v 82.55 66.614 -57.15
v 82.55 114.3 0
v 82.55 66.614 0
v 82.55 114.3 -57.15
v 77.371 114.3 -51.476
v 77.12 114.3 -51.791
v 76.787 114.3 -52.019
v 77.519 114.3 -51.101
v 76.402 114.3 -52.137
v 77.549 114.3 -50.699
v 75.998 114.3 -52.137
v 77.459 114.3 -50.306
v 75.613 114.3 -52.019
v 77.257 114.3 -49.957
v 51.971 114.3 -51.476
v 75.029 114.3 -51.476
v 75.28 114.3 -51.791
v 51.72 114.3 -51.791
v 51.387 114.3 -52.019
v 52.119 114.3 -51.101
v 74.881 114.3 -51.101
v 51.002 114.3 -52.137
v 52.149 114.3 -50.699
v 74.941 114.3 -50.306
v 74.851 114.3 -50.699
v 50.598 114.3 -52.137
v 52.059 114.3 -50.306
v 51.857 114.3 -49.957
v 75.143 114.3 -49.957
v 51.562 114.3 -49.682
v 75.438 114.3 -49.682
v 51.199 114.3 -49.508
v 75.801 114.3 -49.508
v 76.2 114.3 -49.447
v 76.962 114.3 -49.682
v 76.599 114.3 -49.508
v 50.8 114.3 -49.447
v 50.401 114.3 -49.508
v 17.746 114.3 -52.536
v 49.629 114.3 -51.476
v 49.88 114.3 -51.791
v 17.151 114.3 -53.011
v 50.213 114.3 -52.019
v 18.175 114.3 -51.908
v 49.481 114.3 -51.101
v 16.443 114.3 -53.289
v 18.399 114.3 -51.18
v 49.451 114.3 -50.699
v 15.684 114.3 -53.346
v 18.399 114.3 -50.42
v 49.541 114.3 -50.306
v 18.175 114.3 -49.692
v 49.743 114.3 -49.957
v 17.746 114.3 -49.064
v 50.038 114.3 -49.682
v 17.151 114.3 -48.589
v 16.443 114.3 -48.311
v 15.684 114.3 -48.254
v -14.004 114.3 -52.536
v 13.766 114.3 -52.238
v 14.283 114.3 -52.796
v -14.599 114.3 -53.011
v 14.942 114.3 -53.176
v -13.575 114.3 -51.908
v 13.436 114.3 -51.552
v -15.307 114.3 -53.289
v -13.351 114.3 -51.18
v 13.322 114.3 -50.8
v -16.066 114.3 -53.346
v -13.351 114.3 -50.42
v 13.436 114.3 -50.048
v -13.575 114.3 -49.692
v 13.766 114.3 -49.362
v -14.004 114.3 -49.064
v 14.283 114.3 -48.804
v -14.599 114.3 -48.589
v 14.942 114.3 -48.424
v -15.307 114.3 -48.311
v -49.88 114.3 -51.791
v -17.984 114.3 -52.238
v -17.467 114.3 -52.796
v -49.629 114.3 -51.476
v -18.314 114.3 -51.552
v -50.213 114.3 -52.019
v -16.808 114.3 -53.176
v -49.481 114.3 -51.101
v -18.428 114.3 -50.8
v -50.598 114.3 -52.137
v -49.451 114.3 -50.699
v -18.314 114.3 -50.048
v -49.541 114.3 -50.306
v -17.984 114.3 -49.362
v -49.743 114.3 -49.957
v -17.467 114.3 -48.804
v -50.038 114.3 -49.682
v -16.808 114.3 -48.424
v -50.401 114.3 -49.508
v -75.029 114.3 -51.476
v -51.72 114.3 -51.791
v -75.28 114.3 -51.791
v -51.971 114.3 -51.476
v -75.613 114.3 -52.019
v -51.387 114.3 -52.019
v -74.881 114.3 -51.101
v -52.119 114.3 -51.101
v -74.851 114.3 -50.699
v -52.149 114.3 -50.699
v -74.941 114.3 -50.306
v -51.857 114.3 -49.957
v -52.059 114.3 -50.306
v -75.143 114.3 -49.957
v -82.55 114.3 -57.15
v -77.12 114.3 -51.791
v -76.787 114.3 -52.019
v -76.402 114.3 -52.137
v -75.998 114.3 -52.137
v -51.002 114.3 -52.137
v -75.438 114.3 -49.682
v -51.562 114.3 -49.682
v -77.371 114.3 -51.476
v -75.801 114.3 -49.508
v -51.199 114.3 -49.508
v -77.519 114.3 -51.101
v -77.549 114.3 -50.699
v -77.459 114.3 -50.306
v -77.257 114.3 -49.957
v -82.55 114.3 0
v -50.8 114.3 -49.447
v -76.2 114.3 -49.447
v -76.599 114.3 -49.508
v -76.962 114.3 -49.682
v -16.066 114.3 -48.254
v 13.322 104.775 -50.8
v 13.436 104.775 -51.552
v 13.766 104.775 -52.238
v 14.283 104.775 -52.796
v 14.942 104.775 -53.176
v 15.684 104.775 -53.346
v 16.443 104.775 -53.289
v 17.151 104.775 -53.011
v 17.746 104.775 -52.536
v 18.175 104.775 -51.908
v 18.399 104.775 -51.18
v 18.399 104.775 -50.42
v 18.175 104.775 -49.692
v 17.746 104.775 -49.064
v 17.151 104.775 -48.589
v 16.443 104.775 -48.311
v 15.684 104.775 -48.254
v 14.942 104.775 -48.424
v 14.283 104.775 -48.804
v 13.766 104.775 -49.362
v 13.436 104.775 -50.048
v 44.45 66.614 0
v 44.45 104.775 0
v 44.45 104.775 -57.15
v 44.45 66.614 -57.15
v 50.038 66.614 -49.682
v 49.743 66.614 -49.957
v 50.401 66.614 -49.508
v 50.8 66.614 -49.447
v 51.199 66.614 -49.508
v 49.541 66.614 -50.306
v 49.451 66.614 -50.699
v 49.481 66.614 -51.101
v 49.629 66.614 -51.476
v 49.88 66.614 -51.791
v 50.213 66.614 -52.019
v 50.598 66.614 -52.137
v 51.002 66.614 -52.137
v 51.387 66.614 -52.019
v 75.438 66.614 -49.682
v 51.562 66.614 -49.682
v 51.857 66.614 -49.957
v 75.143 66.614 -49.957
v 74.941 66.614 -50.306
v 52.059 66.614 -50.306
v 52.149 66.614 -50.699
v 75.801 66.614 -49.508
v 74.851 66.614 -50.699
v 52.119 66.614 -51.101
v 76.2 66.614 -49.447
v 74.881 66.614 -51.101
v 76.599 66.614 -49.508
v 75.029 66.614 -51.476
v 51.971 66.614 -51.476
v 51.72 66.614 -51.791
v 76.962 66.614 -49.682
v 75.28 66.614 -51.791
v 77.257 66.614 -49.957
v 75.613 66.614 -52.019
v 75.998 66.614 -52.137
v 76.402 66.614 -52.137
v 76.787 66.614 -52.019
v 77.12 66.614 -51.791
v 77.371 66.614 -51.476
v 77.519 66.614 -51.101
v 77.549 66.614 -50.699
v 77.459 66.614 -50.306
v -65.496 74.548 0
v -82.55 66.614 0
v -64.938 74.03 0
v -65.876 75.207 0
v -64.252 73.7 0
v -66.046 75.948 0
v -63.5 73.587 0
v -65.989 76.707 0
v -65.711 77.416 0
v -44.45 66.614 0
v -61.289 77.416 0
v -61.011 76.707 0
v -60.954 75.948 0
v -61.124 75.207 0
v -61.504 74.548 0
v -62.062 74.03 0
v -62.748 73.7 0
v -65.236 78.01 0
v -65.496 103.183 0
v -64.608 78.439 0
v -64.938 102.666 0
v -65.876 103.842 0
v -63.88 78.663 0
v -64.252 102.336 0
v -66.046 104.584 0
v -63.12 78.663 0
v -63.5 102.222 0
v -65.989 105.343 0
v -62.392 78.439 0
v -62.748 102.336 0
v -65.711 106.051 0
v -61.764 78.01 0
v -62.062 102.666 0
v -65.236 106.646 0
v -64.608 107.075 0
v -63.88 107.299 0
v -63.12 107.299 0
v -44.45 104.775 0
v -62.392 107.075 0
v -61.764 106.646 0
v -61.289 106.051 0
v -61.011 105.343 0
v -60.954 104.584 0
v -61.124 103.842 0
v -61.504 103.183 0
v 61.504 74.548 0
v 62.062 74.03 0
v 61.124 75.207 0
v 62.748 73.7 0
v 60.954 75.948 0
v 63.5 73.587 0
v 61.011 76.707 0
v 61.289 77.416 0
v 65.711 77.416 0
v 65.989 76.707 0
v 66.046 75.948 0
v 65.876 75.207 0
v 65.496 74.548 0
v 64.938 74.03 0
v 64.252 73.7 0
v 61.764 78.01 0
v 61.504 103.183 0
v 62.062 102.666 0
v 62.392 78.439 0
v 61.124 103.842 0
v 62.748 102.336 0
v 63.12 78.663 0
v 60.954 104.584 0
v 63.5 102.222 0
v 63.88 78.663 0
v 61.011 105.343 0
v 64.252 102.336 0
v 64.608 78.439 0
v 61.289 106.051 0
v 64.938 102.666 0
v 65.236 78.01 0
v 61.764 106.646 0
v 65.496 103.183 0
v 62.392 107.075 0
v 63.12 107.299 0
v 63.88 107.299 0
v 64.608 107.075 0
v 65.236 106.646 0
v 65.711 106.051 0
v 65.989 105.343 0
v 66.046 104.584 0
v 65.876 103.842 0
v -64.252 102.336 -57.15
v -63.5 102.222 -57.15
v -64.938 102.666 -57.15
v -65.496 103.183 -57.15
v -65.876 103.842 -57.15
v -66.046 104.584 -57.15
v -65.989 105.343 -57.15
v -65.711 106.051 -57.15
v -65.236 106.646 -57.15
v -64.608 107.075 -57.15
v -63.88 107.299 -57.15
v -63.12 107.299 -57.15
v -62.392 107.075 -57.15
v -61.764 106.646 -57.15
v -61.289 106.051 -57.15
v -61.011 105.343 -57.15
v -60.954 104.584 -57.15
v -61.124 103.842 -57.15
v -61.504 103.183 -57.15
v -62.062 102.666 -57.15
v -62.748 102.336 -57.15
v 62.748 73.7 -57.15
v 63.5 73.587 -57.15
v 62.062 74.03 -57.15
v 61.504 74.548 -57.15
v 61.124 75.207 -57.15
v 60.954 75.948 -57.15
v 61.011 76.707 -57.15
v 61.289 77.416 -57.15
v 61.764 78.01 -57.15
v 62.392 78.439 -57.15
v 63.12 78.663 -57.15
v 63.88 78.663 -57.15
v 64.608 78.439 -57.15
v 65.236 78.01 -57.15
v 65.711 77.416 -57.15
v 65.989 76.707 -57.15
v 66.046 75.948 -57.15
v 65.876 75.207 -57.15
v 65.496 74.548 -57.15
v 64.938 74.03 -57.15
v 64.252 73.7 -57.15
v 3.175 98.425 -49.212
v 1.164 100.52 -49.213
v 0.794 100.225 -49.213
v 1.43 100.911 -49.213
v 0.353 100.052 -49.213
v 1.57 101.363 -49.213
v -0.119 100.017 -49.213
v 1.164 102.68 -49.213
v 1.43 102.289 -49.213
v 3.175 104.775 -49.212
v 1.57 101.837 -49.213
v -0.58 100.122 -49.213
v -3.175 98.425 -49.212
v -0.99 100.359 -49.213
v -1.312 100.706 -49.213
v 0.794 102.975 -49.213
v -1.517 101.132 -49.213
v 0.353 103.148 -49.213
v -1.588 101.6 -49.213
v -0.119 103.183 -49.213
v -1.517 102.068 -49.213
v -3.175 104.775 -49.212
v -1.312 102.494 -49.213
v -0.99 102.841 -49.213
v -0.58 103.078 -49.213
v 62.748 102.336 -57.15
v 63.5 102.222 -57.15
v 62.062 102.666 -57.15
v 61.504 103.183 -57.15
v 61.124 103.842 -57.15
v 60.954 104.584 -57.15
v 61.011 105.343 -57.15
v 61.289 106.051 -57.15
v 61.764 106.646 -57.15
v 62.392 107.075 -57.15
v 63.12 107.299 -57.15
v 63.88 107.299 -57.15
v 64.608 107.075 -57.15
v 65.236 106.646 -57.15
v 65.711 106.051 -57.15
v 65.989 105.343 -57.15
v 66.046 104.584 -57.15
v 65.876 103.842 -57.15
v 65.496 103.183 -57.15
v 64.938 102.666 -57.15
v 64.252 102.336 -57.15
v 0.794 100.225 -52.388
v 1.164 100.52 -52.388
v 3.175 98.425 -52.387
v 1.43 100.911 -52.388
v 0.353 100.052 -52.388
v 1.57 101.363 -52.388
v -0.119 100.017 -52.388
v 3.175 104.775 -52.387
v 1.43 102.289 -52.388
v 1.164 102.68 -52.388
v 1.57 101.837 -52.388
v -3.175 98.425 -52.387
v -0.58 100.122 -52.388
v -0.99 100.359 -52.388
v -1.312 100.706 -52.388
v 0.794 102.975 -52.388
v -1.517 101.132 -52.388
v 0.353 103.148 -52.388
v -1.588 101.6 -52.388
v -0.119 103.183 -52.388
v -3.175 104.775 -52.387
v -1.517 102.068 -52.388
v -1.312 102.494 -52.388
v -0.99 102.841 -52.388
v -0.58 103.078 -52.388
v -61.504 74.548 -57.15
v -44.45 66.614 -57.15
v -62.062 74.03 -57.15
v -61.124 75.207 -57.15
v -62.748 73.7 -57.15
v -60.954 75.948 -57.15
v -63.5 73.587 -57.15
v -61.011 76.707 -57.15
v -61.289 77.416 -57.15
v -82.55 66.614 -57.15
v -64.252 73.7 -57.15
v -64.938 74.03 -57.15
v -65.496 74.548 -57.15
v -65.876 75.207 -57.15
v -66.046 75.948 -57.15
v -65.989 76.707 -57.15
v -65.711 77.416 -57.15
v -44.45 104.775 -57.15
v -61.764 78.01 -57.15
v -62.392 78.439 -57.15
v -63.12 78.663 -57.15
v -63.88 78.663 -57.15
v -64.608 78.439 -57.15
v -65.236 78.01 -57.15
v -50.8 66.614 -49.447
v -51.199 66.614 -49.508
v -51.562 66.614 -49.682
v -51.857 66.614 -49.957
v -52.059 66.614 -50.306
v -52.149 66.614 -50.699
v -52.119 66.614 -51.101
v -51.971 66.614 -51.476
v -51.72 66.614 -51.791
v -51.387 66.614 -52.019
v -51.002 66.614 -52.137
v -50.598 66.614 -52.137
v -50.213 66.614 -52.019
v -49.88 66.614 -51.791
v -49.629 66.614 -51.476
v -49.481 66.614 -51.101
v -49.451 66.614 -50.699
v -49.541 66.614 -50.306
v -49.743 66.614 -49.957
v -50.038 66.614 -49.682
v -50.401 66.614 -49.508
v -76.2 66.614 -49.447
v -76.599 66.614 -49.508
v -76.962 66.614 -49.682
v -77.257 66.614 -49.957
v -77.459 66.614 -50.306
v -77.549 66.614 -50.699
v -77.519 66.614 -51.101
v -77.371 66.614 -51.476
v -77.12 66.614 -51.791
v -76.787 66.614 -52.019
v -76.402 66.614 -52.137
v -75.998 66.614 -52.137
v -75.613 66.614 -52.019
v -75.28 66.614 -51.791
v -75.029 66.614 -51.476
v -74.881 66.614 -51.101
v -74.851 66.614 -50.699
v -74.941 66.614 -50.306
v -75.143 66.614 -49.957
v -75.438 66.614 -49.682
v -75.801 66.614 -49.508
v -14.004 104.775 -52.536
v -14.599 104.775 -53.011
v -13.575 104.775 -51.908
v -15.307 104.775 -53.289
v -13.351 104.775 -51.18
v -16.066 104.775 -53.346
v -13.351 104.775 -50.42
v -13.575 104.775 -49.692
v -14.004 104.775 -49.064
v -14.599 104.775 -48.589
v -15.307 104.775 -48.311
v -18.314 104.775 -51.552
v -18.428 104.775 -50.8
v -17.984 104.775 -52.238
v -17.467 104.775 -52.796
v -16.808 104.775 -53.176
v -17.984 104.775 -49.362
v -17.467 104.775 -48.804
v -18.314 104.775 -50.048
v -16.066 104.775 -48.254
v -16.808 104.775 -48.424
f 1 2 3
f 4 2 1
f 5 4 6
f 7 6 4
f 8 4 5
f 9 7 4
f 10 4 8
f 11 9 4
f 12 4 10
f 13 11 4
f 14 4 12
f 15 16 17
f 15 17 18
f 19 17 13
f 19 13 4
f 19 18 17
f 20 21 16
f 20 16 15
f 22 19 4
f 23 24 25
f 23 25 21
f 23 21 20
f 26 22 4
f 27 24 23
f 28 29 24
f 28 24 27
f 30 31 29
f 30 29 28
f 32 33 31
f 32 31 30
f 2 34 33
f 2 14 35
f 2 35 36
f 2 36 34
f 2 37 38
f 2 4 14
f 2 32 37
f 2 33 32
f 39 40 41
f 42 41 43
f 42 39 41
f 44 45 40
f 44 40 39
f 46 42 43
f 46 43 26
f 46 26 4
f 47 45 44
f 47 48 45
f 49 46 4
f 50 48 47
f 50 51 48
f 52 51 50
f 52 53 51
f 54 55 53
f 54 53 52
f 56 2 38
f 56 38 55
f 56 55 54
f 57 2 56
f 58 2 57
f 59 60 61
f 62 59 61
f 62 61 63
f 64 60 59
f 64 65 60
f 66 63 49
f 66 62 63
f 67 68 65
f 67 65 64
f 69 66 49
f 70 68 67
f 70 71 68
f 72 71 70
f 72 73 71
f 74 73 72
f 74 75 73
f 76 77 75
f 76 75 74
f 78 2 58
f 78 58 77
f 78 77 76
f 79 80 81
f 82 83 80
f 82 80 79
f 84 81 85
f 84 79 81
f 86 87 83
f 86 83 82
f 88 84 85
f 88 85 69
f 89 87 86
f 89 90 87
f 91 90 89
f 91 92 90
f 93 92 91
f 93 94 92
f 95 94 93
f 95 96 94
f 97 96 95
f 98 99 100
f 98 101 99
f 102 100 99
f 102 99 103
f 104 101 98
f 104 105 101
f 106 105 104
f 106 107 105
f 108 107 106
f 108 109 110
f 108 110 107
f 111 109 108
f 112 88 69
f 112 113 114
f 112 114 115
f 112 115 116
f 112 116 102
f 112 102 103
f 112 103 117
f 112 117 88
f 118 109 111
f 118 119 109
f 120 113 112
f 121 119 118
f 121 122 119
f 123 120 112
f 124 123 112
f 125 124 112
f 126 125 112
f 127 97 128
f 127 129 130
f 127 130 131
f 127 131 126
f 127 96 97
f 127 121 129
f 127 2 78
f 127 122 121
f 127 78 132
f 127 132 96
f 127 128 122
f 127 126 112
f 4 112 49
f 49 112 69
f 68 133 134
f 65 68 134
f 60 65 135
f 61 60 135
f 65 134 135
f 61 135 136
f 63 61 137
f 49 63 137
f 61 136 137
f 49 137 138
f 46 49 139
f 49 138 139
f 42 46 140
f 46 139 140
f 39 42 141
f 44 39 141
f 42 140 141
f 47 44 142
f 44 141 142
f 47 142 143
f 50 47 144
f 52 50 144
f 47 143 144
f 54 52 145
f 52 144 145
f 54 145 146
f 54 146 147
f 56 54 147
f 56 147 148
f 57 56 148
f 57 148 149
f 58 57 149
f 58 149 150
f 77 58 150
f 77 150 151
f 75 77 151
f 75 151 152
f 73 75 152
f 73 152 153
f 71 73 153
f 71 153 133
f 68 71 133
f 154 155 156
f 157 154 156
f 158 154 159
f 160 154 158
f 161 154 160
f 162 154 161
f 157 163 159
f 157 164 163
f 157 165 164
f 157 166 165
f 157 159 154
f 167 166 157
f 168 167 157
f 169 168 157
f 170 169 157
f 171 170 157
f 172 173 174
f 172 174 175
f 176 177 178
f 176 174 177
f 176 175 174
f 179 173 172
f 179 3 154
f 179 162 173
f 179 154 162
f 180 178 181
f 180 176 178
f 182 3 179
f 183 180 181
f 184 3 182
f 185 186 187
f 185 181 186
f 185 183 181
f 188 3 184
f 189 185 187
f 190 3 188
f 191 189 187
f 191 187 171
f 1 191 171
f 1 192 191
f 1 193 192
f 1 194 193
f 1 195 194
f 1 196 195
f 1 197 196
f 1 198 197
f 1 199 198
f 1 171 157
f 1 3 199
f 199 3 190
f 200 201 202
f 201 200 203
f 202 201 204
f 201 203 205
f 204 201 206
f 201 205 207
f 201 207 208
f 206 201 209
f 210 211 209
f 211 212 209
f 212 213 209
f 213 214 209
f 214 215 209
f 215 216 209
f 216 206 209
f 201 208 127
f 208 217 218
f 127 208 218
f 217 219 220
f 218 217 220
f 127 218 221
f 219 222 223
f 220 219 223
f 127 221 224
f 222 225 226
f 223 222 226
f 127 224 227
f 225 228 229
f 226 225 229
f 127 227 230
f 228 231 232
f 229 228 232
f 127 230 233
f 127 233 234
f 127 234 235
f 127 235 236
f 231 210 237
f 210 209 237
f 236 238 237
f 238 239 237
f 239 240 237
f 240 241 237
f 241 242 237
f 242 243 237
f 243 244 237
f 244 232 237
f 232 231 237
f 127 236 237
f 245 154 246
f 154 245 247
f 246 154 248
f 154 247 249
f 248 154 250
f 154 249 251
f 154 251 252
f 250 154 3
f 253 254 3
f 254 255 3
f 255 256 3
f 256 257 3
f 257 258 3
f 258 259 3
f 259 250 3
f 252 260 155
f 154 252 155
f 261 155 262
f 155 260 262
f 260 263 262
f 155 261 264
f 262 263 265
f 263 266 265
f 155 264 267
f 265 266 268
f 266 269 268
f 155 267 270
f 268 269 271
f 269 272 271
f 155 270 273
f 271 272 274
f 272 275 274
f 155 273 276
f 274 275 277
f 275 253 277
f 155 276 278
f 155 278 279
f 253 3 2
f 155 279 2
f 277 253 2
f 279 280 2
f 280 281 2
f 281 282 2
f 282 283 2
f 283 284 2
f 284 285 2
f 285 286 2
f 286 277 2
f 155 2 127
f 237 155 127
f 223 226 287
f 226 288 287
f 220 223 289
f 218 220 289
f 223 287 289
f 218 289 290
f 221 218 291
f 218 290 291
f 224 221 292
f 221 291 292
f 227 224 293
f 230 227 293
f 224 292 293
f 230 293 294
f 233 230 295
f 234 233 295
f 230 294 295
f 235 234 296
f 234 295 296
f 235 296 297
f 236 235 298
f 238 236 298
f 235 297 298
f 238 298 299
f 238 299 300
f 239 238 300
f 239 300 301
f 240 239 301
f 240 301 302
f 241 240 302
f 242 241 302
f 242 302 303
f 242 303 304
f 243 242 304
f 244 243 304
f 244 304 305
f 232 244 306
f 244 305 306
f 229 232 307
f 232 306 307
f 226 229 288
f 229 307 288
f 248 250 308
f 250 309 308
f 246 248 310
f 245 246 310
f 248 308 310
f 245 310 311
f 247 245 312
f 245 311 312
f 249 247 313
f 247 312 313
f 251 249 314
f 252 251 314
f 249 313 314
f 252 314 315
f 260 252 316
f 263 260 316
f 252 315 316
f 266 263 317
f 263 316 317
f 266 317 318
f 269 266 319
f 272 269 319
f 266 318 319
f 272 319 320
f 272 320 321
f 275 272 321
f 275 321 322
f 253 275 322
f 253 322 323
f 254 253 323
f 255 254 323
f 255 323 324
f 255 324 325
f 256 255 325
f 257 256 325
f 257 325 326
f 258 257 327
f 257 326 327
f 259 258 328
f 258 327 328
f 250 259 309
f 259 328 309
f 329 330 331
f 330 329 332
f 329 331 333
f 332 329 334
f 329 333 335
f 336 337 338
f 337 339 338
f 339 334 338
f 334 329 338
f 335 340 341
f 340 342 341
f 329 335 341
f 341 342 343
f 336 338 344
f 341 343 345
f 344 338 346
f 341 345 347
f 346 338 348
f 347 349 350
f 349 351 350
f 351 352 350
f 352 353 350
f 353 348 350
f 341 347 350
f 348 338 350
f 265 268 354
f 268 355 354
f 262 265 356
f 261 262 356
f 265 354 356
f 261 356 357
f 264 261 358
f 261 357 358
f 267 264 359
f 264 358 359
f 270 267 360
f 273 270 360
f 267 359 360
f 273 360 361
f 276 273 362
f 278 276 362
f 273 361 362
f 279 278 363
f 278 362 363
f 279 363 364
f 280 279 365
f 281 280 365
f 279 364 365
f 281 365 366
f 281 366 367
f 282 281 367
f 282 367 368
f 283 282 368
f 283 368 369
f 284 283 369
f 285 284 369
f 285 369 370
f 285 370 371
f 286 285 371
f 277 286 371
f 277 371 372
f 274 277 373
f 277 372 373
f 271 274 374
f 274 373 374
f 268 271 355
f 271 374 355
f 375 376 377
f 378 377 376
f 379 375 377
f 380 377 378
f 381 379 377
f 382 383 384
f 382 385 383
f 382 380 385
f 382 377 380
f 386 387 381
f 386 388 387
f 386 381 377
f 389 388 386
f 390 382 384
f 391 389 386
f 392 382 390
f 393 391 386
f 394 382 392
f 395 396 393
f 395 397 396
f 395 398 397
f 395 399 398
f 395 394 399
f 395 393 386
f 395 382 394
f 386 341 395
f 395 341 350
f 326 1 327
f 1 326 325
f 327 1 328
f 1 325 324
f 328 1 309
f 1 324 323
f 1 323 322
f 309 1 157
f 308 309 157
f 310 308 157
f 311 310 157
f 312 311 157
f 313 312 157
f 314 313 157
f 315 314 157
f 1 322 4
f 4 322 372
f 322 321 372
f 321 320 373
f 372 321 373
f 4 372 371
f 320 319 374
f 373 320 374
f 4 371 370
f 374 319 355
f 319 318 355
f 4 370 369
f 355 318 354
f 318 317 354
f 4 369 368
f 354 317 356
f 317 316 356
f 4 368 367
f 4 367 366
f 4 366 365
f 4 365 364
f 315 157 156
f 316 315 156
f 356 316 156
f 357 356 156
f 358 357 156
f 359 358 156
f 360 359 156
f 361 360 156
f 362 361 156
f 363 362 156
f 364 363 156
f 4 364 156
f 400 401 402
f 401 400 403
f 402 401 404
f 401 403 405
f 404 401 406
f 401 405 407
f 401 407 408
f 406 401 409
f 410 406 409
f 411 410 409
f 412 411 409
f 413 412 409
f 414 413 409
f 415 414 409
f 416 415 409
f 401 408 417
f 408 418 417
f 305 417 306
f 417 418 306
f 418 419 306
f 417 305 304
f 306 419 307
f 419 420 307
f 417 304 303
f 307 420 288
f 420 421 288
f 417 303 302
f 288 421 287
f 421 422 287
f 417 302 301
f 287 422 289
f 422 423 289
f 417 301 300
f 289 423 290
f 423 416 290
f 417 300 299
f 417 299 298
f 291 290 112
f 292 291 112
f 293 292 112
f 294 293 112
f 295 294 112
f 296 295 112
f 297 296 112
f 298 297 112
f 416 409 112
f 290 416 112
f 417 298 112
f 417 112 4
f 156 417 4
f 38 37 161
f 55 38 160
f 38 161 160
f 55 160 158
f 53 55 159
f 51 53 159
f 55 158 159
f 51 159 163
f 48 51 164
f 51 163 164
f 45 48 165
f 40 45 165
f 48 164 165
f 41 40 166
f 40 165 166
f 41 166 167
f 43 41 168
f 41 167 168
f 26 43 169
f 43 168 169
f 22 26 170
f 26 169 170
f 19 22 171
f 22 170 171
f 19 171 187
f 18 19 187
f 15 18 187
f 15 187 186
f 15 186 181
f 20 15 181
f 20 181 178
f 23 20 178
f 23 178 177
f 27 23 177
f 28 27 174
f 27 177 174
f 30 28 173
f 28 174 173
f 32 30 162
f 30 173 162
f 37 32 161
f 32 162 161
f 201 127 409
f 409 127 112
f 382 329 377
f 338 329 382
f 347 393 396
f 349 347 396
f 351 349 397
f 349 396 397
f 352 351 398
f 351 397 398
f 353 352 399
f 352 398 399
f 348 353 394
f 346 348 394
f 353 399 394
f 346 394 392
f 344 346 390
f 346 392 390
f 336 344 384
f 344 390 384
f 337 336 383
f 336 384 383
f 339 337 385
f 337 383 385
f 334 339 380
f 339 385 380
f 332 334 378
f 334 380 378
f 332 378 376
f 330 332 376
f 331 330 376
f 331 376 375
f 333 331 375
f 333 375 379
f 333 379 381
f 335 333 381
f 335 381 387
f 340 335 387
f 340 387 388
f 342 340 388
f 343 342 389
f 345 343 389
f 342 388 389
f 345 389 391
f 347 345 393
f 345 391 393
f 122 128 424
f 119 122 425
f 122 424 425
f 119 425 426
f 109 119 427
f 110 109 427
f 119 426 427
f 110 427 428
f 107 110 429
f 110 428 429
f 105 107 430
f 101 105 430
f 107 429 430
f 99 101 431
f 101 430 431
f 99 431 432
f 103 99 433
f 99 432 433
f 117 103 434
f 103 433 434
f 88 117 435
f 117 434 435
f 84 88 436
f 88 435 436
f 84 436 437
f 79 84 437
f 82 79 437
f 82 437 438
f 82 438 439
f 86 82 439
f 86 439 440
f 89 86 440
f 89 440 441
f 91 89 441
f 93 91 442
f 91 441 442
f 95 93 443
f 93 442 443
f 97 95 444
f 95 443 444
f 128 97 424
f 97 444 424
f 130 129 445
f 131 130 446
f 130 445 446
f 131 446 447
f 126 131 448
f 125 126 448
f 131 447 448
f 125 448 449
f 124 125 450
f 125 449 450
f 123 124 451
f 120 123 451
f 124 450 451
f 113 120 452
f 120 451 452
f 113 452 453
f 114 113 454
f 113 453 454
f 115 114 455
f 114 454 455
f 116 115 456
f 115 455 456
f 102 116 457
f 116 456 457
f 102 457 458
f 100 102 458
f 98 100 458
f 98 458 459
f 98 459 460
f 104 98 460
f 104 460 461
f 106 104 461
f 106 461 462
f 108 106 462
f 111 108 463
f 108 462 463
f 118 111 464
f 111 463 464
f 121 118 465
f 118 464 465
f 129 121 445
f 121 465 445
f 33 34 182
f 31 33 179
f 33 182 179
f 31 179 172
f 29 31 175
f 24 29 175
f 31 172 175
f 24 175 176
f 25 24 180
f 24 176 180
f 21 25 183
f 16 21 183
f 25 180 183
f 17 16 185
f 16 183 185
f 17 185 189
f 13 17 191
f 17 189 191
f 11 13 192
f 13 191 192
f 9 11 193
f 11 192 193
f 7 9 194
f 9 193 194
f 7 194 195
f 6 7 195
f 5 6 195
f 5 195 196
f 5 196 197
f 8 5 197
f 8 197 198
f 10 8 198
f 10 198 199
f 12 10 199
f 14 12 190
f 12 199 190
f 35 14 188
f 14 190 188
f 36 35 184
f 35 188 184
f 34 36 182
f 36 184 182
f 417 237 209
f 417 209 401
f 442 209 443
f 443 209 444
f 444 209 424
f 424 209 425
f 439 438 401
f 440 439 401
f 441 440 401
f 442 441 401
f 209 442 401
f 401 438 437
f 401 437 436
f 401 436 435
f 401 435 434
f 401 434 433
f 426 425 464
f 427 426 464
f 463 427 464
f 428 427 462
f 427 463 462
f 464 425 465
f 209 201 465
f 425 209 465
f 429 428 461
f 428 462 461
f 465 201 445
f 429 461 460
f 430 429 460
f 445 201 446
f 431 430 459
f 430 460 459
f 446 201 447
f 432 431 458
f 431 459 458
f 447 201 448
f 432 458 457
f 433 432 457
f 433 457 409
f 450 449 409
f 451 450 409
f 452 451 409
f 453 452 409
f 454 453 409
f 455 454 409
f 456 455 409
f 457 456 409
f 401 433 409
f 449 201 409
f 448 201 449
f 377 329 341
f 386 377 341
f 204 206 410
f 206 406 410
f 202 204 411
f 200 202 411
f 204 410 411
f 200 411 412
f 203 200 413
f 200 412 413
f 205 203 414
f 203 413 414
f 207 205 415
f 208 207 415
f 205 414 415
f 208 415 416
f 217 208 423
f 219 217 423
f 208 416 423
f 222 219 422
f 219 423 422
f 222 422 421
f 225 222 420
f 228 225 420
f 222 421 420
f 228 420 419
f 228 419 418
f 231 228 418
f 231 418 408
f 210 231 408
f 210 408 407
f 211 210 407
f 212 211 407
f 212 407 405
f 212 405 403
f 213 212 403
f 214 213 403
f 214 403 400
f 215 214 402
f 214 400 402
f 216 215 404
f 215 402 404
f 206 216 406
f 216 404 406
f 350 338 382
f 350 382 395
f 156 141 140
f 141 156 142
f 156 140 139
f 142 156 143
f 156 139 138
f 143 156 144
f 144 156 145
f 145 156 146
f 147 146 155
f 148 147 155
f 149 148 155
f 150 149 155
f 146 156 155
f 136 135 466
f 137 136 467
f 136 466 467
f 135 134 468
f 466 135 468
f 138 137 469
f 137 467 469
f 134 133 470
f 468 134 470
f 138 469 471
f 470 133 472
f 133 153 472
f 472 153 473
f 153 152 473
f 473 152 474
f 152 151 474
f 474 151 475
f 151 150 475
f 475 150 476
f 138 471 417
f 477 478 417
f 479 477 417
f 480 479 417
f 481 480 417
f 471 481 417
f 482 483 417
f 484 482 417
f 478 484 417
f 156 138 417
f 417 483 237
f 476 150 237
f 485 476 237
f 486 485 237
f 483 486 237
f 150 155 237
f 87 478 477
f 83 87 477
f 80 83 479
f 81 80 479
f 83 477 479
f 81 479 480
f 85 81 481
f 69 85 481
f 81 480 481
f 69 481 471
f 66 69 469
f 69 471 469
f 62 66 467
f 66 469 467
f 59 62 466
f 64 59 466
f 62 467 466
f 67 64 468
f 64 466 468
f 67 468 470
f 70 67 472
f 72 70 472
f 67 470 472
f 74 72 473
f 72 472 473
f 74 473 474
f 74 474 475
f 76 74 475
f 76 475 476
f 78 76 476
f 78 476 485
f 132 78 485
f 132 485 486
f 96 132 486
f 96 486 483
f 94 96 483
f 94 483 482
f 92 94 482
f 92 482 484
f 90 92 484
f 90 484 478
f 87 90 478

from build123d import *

# Parameters (mm, degrees)
SKETCH1_W                                      = 165.1
SKETCH1_H                                      = 228.6
BOSS_EXTRUDE1_DEPTH                            = 19.05
SKETCH2_W                                      = 76.2
SKETCH2_H                                      = 203.2
CUT_EXTRUDE1_DEPTH                             = 143.27401379
SKETCH3_W                                      = 165.1
SKETCH3_H                                      = 9.525
BOSS_EXTRUDE2_DEPTH                            = 57.15
SKETCH4_W                                      = 19.05
SKETCH4_H                                      = 38.1
BOSS_EXTRUDE3_DEPTH                            = 12.7
SKETCH7_W                                      = 88.9
SKETCH7_H                                      = 12.7
BOSS_EXTRUDE4_DEPTH                            = 19.05
SKETCH8_W                                      = 82.55
SKETCH8_H                                      = 19.05
CUT_EXTRUDE4_DEPTH                             = 2.54
F_8_32_TAPPED_HOLE1_D                          = 3.4544
F_8_32_TAPPED_HOLE1_DEPTH                      = 12.7
F_8_32_TAPPED_HOLE1_TIP                        = 1.037806461
F_1_4_CLEARANCE_HOLE1_D                        = 6.7564
F_1_4_CLEARANCE_HOLE1_DEPTH                    = 10.16
CBORE_FOR_8_SOCKET_HEAD_CAP_SCREW1_D           = 4.4958
CBORE_FOR_8_SOCKET_HEAD_CAP_SCREW1_CBORE_D     = 7.9375
CBORE_FOR_8_SOCKET_HEAD_CAP_SCREW1_CBORE_DEPTH = 4.1656
F_1_4_20_TAPPED_HOLE1_D                        = 5.1054
BOSS_EXTRUDE5_START                            = -7.9375
SKETCH22_W                                     = 6.35
SKETCH22_H                                     = 6.35
BOSS_EXTRUDE5_DEPTH                            = 3.175
SKETCH23_R                                     = 1.5875
CUT_EXTRUDE5_DEPTH                             = 3.175
SKETCH27_W                                     = 57.15
SKETCH27_H                                     = 47.685786878
BOSS_EXTRUDE6_DEPTH                            = 38.1
SKETCH26_W                                     = 19.05
SKETCH26_H                                     = 228.6
CUT_EXTRUDE7_DEPTH                             = 246.442080744
SKETCH29_W                                     = 1.35255
SKETCH29_H                                     = 47.685786878
F_6_32_TAPPED_HOLE1_AT_2_COUNT                 = 2
F_6_32_TAPPED_HOLE1_AT_2_PITCH                 = 25.4
F_6_32_TAPPED_HOLE1_AT_3_COUNT                 = 2
F_6_32_TAPPED_HOLE1_AT_3_PITCH                 = 127
F_6_32_TAPPED_HOLE1_AT_4_COUNT                 = 2
F_6_32_TAPPED_HOLE1_AT_4_PITCH                 = 152.4
SKETCH31_W                                     = 2.5527
SKETCH31_H                                     = 57.15
F_1_4_20_TAPPED_HOLE2_AT_2_COUNT               = 2
F_1_4_20_TAPPED_HOLE2_AT_2_PITCH               = 28.635786878
F_1_4_20_TAPPED_HOLE2_AT_3_COUNT               = 2
F_1_4_20_TAPPED_HOLE2_AT_3_PITCH               = 127
F_1_4_20_TAPPED_HOLE2_AT_4_COUNT               = 2
F_1_4_20_TAPPED_HOLE2_AT_4_PITCH               = 130.188356968


with BuildPart() as part:
    # Sketch1 → Boss-Extrude1 (new body)
    with BuildSketch(Plane.XY):
        Rectangle(SKETCH1_W, SKETCH1_H)
    extrude(amount=BOSS_EXTRUDE1_DEPTH)

    # Sketch2 → Cut-Extrude1 (cut, through all)
    with BuildSketch(Plane.XY.offset(19.05)):
        with Locations((0, -12.7)):
            Rectangle(SKETCH2_W, SKETCH2_H)
    extrude(amount=-CUT_EXTRUDE1_DEPTH, mode=Mode.SUBTRACT)

    # Sketch3 → Boss-Extrude2 (add)
    with BuildSketch(Plane(origin=(0, 0, 0), x_dir=(-1, 0, 0), z_dir=(0, 0, -1))):
        with Locations((0, 109.5375)):
            Rectangle(SKETCH3_W, SKETCH3_H)
    extrude(amount=BOSS_EXTRUDE2_DEPTH)

    # Sketch4 → Boss-Extrude3 (add)
    with BuildSketch(Plane(origin=(0, 0, -57.15), x_dir=(-1, 0, 0), z_dir=(0, 0, -1))):
        with Locations((-73.025, 85.725)):
            Rectangle(SKETCH4_W, SKETCH4_H)
    boss_extrude3 = extrude(amount=-BOSS_EXTRUDE3_DEPTH)

    # Mirror1: Boss-Extrude3 across plane
    add(boss_extrude3.mirror(Plane(origin=(0, 0, 0), x_dir=(0, 0, 1), z_dir=(1, 0, 0))))

    # Sketch7 → Boss-Extrude4 (add)
    with BuildSketch(Plane.XY.offset(19.05)):
        with Locations((-60.325, -107.95)):
            Rectangle(SKETCH7_W, SKETCH7_H)
    boss_extrude4 = extrude(amount=-BOSS_EXTRUDE4_DEPTH)

    # Sketch8 → Cut-Extrude4 (cut)
    with BuildSketch(Plane(origin=(0, -114.3, 0), x_dir=(-1, 0, 0), z_dir=(0, -1, 0))):
        with Locations((60.325, -9.525)):
            Rectangle(SKETCH8_W, SKETCH8_H)
    cut_extrude4 = extrude(amount=-CUT_EXTRUDE4_DEPTH, mode=Mode.SUBTRACT)

    # Mirror3: Boss-Extrude4, Cut-Extrude4 across plane
    add(boss_extrude4.mirror(Plane(origin=(0, 0, 0), x_dir=(0, 0, 1), z_dir=(1, 0, 0))))
    add(cut_extrude4.mirror(Plane(origin=(0, 0, 0), x_dir=(0, 0, 1), z_dir=(1, 0, 0))), mode=Mode.SUBTRACT)

    # #8-32 Tapped Hole1
    with Locations(Plane(origin=(0, 114.3, 0), x_dir=(1, 0, 0), z_dir=(0, 1, 0))):
        with Locations((-76.2, -12.7), (-63.5, -12.7), (63.5, -12.7), (76.2, -12.7)):
            Hole(F_8_32_TAPPED_HOLE1_D / 2, depth=F_8_32_TAPPED_HOLE1_DEPTH)
            with Locations((0, 0, -(F_8_32_TAPPED_HOLE1_DEPTH + F_8_32_TAPPED_HOLE1_TIP / 2))):  # 118° drill point
                Cone(0, F_8_32_TAPPED_HOLE1_D / 2, F_8_32_TAPPED_HOLE1_TIP, mode=Mode.SUBTRACT)

    # 1/4 Clearance Hole1
    with Locations(Plane(origin=(0, -101.6, 0), x_dir=(1, 0, 0), z_dir=(0, 1, 0))):
        with Locations((-95.25, -6.35), (-25.4, -6.35), (25.4, -6.35), (95.25, -6.35)):
            Hole(F_1_4_CLEARANCE_HOLE1_D / 2, depth=F_1_4_CLEARANCE_HOLE1_DEPTH)

    # CBORE for #8 Socket Head Cap Screw1 (through all)
    with Locations(Plane.XY.offset(19.05)):
        with Locations((-76.2, 9.525), (-44.45, 9.525), (44.45, 9.525), (76.2, 9.525)):
            CounterBoreHole(CBORE_FOR_8_SOCKET_HEAD_CAP_SCREW1_D / 2, CBORE_FOR_8_SOCKET_HEAD_CAP_SCREW1_CBORE_D / 2, CBORE_FOR_8_SOCKET_HEAD_CAP_SCREW1_CBORE_DEPTH)

    # 1/4-20 Tapped Hole1 (through all)
    with Locations(Plane(origin=(0, 114.3, 0), x_dir=(1, 0, 0), z_dir=(0, 1, 0))):
        with Locations((15.875, 50.8), (-15.875, 50.8)):
            Hole(F_1_4_20_TAPPED_HOLE1_D / 2)

    # Sketch27 → Boss-Extrude6 (add)
    with BuildSketch(Plane(origin=(82.55, 0, 0), x_dir=(0, 0, -1), z_dir=(1, 0, 0))):
        with Locations((28.575, 90.457106561)):
            Rectangle(SKETCH27_W, SKETCH27_H)
    boss_extrude6 = extrude(amount=-BOSS_EXTRUDE6_DEPTH)

    # Mirror4: Boss-Extrude6 across plane
    add(boss_extrude6.mirror(Plane(origin=(0, 0, 0), x_dir=(0, 0, 1), z_dir=(1, 0, 0))))

    # Sketch26 → Cut-Extrude7 (cut, through all)
    with BuildSketch(Plane(origin=(104.775, 0, 0), x_dir=(0, 0, -1), z_dir=(1, 0, 0))):
        with Locations((-9.525, 0)):
            Rectangle(SKETCH26_W, SKETCH26_H)
    extrude(amount=-CUT_EXTRUDE7_DEPTH, mode=Mode.SUBTRACT)

    # Sketch29 → #6-32 Tapped Hole1 (revolve, cut)
    with BuildSketch(Plane(origin=(-76.2, 114.3, -50.8), x_dir=(0, 0, 1), z_dir=(1, 0, 0))):
        with Locations((0.676275, 23.842893439)):
            Rectangle(SKETCH29_W, SKETCH29_H)
    f_6_32_tapped_hole1 = revolve(axis=Axis((-76.2, 120.65, -50.8), (0, -1, 0)), mode=Mode.SUBTRACT)

    # #6-32 Tapped Hole1 at 2: #6-32 Tapped Hole1 ×2
    with Locations(*[(i * F_6_32_TAPPED_HOLE1_AT_2_PITCH, 0, 0) for i in range(1, F_6_32_TAPPED_HOLE1_AT_2_COUNT)]):
        add(f_6_32_tapped_hole1, mode=Mode.SUBTRACT)

    # #6-32 Tapped Hole1 at 3: #6-32 Tapped Hole1 ×2
    with Locations(*[(i * F_6_32_TAPPED_HOLE1_AT_3_PITCH, 0, 0) for i in range(1, F_6_32_TAPPED_HOLE1_AT_3_COUNT)]):
        add(f_6_32_tapped_hole1, mode=Mode.SUBTRACT)

    # #6-32 Tapped Hole1 at 4: #6-32 Tapped Hole1 ×2
    with Locations(*[(i * F_6_32_TAPPED_HOLE1_AT_4_PITCH, 0, 0) for i in range(1, F_6_32_TAPPED_HOLE1_AT_4_COUNT)]):
        add(f_6_32_tapped_hole1, mode=Mode.SUBTRACT)

    # Sketch31 → 1/4-20 Tapped Hole2 (revolve, cut)
    with BuildSketch(Plane(origin=(-63.5, 104.775, 0), x_dir=(0, -1, 0), z_dir=(1, 0, 0))):
        with Locations((1.27635, 28.575)):
            Rectangle(SKETCH31_W, SKETCH31_H)
    f_1_4_20_tapped_hole2 = revolve(axis=Axis((-63.5, 104.775, 6.35), (0, 0, -1)), mode=Mode.SUBTRACT)

    # 1/4-20 Tapped Hole2 at 2: 1/4-20 Tapped Hole2 ×2
    with Locations(*[(0, -i * F_1_4_20_TAPPED_HOLE2_AT_2_PITCH, 0) for i in range(1, F_1_4_20_TAPPED_HOLE2_AT_2_COUNT)]):
        add(f_1_4_20_tapped_hole2, mode=Mode.SUBTRACT)

    # 1/4-20 Tapped Hole2 at 3: 1/4-20 Tapped Hole2 ×2
    with Locations(*[(i * F_1_4_20_TAPPED_HOLE2_AT_3_PITCH, 0, 0) for i in range(1, F_1_4_20_TAPPED_HOLE2_AT_3_COUNT)]):
        add(f_1_4_20_tapped_hole2, mode=Mode.SUBTRACT)

    # 1/4-20 Tapped Hole2 at 4: 1/4-20 Tapped Hole2 ×2
    with Locations(*[Vector(0.9755096612129927, -0.21995658862628414, 0) * (i * F_1_4_20_TAPPED_HOLE2_AT_4_PITCH) for i in range(1, F_1_4_20_TAPPED_HOLE2_AT_4_COUNT)]):
        add(f_1_4_20_tapped_hole2, mode=Mode.SUBTRACT)


with BuildPart() as body_2:
    # Sketch22 → Boss-Extrude5 (new body)
    with BuildSketch(Plane(origin=(0, 0, -57.15), x_dir=(-1, 0, 0), z_dir=(0, 0, -1)).offset(BOSS_EXTRUDE5_START)):
        with Locations((0, 101.6)):
            Rectangle(SKETCH22_W, SKETCH22_H)
    extrude(amount=BOSS_EXTRUDE5_DEPTH)

    # Sketch23 → Cut-Extrude5 (cut)
    with BuildSketch(Plane(origin=(0, 0, -52.3875), x_dir=(-1, 0, 0), z_dir=(0, 0, -1))):
        with Locations((0, 101.6)):
            Circle(SKETCH23_R)
    extrude(amount=-CUT_EXTRUDE5_DEPTH, mode=Mode.SUBTRACT)


solid = Compound([part.part, body_2.part])
